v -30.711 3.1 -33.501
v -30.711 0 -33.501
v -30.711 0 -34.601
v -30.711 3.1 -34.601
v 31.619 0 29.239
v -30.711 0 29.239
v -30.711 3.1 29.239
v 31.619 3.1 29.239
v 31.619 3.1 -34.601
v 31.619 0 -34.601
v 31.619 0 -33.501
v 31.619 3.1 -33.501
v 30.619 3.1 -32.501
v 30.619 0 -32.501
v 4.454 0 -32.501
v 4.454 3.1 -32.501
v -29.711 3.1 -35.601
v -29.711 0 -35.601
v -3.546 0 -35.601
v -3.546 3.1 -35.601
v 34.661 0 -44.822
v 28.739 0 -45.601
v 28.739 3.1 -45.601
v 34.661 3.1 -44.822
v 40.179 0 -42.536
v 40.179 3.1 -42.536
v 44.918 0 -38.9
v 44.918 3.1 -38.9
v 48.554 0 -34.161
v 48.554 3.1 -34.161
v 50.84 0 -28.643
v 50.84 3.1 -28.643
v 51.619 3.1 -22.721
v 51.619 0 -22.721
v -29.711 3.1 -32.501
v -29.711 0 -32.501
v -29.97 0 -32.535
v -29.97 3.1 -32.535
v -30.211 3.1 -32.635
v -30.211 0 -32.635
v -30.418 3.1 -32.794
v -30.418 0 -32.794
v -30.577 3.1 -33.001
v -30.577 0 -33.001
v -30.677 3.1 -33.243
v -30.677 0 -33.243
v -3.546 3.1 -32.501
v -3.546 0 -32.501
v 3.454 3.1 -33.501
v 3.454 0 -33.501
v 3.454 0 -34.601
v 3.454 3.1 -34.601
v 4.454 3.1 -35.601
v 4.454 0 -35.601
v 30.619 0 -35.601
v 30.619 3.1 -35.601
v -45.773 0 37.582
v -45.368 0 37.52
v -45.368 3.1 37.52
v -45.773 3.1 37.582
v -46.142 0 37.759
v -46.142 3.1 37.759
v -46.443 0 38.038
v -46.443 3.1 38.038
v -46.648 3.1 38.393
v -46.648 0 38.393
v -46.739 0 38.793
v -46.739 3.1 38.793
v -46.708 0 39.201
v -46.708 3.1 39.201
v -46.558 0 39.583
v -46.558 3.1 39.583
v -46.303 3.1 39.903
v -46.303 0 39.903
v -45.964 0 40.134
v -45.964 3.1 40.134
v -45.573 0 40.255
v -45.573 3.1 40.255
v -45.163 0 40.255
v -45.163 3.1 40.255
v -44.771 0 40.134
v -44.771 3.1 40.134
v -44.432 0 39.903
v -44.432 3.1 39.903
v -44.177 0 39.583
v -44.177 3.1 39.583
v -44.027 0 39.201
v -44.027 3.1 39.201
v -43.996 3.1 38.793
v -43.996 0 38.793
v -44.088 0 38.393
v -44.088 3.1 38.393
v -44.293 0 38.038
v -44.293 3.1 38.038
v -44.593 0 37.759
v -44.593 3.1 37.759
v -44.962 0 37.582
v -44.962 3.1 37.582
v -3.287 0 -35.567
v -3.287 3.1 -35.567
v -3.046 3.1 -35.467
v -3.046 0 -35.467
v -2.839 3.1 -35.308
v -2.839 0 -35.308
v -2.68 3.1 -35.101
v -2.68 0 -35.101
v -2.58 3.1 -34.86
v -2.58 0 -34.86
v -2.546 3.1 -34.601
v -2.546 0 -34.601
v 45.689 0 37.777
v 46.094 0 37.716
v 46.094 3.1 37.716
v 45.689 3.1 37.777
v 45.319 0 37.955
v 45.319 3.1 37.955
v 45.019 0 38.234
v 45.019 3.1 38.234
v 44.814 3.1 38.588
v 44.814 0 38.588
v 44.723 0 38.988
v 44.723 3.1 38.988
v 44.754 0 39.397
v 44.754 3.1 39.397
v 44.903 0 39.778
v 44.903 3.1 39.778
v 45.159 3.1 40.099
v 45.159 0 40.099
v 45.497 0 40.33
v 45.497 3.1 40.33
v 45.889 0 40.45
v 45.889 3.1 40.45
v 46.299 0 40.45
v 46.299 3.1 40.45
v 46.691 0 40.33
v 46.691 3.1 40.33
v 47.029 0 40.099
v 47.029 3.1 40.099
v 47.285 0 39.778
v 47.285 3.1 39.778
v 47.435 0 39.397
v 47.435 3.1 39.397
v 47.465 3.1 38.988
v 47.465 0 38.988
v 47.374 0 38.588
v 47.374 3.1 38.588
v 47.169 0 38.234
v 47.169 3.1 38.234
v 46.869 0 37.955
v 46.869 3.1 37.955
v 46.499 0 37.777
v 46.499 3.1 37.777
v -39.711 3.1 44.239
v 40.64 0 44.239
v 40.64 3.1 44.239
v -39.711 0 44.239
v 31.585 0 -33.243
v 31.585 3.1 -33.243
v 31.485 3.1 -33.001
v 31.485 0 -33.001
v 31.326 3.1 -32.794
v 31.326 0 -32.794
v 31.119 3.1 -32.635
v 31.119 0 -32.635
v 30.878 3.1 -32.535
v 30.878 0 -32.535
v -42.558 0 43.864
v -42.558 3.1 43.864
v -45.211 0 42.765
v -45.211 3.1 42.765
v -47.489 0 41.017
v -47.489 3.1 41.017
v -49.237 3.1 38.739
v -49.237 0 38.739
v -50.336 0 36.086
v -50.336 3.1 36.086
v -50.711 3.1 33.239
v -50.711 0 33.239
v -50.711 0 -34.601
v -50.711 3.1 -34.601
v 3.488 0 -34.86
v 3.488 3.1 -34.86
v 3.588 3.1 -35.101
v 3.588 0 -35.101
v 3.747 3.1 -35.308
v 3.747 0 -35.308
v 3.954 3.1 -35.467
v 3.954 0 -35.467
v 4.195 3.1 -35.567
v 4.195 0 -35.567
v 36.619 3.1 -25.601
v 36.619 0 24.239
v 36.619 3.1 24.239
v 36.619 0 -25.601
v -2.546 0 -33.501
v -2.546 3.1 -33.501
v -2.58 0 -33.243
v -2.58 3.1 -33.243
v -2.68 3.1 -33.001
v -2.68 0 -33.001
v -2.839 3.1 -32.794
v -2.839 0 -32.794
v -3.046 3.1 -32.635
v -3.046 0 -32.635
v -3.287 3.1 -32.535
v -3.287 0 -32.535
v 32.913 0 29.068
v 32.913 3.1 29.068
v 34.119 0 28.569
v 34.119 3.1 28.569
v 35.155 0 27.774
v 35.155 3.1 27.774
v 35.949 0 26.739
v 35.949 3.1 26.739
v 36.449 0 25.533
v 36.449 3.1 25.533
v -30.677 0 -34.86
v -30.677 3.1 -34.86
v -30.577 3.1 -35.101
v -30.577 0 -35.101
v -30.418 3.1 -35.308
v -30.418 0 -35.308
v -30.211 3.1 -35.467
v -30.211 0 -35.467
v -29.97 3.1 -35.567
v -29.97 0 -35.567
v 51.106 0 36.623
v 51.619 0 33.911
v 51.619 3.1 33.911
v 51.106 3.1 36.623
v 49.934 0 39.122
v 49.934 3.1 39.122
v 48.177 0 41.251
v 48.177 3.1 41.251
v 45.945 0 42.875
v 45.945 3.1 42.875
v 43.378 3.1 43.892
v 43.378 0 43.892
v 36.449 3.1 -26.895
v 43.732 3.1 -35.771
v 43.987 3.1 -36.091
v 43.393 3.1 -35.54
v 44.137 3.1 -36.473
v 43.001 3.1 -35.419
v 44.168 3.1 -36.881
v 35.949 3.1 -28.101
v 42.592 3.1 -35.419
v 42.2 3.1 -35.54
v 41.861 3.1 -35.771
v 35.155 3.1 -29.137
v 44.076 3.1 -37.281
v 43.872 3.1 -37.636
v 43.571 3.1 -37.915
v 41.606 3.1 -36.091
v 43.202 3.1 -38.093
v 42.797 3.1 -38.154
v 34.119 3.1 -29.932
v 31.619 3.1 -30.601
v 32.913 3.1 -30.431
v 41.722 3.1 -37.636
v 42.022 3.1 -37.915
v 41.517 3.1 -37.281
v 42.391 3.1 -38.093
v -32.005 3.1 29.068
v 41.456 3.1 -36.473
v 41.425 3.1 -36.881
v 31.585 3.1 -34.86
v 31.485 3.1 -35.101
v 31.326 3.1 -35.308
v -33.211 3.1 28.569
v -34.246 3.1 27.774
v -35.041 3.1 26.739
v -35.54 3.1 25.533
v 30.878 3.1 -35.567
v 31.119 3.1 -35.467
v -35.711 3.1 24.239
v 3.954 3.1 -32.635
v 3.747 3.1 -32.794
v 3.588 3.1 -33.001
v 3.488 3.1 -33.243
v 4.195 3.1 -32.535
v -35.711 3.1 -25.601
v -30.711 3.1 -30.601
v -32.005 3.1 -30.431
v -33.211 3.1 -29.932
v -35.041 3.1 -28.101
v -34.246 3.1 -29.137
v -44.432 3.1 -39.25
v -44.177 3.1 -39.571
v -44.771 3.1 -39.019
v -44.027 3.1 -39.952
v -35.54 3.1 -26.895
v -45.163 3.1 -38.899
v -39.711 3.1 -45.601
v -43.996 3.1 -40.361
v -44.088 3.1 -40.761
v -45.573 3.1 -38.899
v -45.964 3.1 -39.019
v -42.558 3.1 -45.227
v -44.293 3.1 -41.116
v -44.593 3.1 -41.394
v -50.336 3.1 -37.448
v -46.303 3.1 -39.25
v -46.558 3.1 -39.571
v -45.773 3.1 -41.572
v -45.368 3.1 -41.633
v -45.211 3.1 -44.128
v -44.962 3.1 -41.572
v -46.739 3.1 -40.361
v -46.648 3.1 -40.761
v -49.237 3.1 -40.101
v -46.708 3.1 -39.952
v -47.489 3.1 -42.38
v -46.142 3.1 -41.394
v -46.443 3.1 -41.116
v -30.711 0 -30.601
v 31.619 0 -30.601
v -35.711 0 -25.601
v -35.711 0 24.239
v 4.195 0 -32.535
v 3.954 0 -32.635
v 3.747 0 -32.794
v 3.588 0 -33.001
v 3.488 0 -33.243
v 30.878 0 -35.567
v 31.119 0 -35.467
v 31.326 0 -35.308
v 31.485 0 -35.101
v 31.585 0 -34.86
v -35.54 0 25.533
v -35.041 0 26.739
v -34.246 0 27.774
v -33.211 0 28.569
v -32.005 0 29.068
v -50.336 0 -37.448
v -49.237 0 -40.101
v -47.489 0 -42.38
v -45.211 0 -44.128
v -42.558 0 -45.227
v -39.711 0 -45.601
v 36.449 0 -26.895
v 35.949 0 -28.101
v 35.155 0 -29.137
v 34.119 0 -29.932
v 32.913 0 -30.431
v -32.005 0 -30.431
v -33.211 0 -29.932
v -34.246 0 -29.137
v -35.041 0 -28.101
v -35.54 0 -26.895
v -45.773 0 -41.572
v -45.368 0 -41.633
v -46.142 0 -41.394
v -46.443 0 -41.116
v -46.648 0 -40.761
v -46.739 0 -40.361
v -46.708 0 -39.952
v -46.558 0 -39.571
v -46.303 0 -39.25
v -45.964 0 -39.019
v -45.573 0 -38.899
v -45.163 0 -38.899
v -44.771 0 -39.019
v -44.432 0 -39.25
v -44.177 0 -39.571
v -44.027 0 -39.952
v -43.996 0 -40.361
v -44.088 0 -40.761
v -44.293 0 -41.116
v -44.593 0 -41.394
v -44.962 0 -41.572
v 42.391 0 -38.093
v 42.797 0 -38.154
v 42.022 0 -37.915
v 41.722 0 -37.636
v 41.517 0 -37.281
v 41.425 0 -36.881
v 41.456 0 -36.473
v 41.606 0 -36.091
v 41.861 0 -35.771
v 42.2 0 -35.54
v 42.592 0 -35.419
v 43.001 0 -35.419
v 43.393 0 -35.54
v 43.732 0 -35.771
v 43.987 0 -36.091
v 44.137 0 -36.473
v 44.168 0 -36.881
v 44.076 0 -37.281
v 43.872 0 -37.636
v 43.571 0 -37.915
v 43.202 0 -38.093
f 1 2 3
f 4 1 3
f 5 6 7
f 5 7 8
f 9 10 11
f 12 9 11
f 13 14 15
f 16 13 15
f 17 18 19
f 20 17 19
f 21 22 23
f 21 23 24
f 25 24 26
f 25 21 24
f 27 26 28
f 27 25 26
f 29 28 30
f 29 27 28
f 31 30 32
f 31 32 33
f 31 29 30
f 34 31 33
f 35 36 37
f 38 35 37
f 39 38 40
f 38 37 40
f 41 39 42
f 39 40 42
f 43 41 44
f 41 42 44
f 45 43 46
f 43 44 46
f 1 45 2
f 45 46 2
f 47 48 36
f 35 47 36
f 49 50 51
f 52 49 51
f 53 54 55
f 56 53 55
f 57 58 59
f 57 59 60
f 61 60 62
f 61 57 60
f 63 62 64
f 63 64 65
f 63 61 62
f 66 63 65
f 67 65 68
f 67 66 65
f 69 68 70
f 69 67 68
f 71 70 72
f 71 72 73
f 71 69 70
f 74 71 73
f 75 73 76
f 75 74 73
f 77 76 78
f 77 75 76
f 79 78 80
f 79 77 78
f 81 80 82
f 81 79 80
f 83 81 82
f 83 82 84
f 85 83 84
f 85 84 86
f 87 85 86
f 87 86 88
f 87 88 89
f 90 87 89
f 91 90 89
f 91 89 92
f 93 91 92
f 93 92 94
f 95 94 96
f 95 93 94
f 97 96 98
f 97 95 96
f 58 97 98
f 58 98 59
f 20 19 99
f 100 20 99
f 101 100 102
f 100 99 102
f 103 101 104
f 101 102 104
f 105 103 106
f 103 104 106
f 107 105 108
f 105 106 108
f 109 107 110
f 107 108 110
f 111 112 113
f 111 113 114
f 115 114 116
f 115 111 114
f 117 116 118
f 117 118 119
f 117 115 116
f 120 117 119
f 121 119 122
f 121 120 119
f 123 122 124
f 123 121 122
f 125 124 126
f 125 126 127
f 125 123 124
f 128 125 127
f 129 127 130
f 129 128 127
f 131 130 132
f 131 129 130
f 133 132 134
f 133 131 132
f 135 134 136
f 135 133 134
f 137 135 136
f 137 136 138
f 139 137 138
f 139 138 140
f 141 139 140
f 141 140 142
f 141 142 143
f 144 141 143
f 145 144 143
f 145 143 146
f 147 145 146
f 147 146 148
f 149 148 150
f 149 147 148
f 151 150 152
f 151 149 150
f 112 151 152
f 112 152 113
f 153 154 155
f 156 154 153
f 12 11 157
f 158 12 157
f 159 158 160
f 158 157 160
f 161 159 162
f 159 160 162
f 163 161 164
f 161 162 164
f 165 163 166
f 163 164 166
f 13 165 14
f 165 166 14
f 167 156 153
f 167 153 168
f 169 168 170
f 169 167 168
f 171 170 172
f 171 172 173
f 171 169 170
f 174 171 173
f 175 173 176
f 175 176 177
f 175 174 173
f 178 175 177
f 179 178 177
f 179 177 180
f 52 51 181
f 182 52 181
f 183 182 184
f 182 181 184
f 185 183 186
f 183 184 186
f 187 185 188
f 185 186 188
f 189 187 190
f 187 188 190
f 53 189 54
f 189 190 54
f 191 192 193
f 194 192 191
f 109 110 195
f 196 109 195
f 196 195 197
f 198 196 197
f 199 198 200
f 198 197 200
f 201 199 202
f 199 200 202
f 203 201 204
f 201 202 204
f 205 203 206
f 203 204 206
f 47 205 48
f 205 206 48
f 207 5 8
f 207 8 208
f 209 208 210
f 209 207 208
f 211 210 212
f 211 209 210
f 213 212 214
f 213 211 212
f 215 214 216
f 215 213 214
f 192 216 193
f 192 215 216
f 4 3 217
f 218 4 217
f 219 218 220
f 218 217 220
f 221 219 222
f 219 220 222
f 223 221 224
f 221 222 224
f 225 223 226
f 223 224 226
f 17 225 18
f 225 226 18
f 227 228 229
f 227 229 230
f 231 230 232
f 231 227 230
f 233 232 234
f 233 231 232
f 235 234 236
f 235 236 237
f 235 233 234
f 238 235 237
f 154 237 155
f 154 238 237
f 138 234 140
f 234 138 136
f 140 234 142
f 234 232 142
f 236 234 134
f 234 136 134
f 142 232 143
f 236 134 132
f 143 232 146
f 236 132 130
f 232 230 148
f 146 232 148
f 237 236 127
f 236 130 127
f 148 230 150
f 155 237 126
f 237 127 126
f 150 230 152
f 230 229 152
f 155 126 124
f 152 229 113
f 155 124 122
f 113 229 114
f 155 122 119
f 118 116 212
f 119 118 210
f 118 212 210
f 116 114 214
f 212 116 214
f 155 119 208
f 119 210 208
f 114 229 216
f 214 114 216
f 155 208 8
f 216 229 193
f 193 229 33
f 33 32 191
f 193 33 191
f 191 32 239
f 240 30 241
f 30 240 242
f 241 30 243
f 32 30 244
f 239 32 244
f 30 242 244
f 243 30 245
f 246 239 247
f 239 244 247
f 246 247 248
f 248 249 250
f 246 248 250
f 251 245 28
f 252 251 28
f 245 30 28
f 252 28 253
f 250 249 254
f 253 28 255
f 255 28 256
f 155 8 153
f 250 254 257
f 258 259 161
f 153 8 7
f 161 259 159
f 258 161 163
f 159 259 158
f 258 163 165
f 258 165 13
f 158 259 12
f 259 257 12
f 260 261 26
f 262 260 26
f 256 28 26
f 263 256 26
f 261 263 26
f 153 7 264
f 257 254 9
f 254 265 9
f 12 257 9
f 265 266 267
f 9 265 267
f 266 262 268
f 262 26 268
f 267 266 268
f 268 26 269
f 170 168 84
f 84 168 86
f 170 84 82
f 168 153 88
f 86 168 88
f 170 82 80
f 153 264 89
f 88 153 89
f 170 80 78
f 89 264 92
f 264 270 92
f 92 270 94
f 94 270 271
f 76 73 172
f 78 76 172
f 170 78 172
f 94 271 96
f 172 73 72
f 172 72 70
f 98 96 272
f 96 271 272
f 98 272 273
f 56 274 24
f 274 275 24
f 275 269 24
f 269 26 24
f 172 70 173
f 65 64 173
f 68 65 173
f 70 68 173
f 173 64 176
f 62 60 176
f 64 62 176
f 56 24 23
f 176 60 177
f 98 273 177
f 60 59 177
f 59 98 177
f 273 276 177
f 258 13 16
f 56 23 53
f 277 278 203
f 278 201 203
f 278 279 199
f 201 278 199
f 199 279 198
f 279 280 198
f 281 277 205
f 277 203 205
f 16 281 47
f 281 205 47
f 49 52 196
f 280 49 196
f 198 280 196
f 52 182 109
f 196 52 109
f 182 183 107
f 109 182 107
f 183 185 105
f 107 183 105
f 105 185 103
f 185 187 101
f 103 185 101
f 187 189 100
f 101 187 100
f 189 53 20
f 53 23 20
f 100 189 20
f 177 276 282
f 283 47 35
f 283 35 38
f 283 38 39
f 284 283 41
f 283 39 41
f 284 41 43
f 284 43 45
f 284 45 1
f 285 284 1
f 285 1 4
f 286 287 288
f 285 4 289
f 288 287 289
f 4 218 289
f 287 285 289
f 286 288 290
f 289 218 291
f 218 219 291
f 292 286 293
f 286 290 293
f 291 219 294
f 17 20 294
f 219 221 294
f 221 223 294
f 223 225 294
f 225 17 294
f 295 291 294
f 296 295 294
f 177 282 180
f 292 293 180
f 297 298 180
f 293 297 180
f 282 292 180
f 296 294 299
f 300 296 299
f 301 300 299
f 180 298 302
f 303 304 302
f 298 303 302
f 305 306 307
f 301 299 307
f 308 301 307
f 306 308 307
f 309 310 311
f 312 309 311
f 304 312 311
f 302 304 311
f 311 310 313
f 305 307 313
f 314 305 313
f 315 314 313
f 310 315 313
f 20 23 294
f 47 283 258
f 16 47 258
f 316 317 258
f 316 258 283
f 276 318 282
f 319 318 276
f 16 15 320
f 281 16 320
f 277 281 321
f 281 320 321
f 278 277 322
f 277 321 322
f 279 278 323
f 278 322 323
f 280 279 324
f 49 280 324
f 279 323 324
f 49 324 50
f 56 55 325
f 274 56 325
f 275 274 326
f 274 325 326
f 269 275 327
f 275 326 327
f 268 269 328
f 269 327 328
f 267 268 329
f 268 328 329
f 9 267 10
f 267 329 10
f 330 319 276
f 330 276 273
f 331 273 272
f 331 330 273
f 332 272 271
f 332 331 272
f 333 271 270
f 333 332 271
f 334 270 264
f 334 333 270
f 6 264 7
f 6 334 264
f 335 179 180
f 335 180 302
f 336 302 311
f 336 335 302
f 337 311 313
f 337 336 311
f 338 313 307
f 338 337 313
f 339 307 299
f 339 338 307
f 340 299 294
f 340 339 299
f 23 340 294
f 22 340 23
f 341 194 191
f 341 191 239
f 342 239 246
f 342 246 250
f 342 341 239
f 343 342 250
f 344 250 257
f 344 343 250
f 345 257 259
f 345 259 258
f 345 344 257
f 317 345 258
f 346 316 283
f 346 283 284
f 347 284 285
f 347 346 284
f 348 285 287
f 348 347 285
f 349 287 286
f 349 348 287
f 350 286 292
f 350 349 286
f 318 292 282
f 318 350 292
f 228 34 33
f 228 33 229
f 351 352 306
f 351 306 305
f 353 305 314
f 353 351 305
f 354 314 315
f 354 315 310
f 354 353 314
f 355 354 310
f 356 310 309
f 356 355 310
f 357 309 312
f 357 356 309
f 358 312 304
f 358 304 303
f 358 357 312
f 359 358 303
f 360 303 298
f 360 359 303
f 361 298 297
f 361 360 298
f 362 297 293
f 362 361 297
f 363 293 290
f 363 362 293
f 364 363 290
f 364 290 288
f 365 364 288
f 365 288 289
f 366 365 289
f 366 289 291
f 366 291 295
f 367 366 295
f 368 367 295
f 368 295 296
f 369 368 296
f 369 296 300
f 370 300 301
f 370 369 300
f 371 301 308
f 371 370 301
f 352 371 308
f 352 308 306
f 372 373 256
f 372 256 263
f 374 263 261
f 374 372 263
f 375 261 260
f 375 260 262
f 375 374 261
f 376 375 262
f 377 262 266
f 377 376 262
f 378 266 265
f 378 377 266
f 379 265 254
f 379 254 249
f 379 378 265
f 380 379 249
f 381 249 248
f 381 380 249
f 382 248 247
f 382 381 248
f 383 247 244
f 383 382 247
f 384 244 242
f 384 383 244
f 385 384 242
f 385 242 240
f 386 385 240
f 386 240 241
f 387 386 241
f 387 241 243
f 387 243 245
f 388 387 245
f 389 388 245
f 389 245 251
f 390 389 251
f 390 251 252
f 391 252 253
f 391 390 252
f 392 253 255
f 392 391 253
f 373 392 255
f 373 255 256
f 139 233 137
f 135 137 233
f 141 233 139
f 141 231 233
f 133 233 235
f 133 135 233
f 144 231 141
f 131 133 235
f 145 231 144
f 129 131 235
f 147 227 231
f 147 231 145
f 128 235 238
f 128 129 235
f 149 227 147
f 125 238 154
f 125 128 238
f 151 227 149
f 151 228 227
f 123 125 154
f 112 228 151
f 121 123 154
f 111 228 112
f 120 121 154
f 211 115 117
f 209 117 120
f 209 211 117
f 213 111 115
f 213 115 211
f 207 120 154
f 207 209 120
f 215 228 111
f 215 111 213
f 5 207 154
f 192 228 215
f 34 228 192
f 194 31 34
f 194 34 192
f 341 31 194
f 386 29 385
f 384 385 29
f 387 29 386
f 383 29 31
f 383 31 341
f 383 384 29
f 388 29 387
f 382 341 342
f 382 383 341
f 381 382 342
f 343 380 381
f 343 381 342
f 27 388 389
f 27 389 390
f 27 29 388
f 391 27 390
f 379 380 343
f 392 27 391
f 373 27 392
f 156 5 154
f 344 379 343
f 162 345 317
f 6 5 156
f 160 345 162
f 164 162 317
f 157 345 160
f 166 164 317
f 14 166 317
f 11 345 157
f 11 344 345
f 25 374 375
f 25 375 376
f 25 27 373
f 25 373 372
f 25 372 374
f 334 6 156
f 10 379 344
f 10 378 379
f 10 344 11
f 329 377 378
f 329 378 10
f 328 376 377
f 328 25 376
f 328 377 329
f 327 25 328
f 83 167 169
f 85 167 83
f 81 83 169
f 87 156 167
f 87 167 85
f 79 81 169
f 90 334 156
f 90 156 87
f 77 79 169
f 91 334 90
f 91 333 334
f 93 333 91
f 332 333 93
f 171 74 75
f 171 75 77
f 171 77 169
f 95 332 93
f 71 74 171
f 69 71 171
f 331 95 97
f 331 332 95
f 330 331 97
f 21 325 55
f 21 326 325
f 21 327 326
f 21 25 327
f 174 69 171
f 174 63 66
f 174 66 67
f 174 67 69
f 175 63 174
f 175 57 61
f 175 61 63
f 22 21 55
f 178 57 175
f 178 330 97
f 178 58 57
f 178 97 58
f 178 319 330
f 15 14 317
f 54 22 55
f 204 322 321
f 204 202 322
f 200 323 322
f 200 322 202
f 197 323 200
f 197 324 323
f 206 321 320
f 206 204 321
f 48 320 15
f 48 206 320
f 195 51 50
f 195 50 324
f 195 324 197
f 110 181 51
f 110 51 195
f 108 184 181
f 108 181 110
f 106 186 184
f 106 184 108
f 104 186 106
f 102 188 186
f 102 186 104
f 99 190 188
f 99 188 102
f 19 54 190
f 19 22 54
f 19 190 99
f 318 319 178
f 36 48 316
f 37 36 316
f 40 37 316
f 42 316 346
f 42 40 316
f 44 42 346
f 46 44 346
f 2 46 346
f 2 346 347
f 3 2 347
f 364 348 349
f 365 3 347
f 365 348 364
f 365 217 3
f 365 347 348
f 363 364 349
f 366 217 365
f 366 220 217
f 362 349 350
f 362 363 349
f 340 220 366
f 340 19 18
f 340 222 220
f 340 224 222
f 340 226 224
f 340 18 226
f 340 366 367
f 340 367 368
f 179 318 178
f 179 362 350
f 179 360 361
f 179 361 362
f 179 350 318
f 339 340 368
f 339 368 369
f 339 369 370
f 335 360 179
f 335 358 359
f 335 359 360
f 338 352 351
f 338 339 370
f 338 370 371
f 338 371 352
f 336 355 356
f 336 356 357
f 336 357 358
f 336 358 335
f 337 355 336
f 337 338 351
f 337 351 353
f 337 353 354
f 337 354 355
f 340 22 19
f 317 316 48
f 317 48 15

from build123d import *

# Parameters (mm, degrees)
SKETCH1_R           = 1.375
BOSS_EXTRUDE1_DEPTH = 3.1


with BuildPart() as part:
    # Sketch1 → Boss-Extrude1 (new body)
    with BuildSketch(Plane(origin=(0, 0, 0), x_dir=(1, 0, 0), z_dir=(0, 1, 0))):
        with BuildLine():
            Line((-39.71074184, 45.601377345), (28.739257907, 45.601389398))
            ThreePointArc((28.739257907, 45.601389398), (44.917862085, 38.899993272), (51.619259514, 22.721389634))
            Line((51.619259514, 22.721389634), (51.619259514, -33.910586665))
            ThreePointArc((51.619259514, -33.910586665), (48.176660713, -41.25083682), (40.639819253, -44.238608506))
            Line((40.639819253, -44.238608506), (-39.71072563, -44.238622655))
            ThreePointArc((-39.71072563, -44.238622655), (-47.488919901, -41.016788494), (-50.710740093, -33.238588436))
            Line((-50.710740093, -33.238588436), (-50.710740093, 34.601411853))
            ThreePointArc((-50.710740093, 34.601411853), (-47.48890491, 42.379565328), (-39.71074184, 45.601377345))
        make_face()
        with Locations(Location((-45.367589881, 40.25824398, 0), (0, 0, 90))):
            Circle(SKETCH1_R, mode=Mode.SUBTRACT)
        with Locations(Location((-45.367595522, -38.895467925, 0), (0, 0, 90))):
            Circle(SKETCH1_R, mode=Mode.SUBTRACT)
        with Locations(Location((46.094055761, -39.090799779, 0), (0, 0, 90))):
            Circle(SKETCH1_R, mode=Mode.SUBTRACT)
        with Locations(Location((42.796541827, 36.778672843, 0), (0, 0, 90))):
            Circle(SKETCH1_R, mode=Mode.SUBTRACT)
        with BuildLine():
            Line((36.619259514, -24.238609214), (36.619259514, 25.60137805))
            ThreePointArc((36.619259514, 25.60137805), (35.15479342, 29.136911955), (31.619259514, 30.60137805))
            Line((31.619259514, 30.60137805), (-30.710740093, 30.60137805))
            ThreePointArc((-30.710740093, 30.60137805), (-34.246273999, 29.136911955), (-35.710740093, 25.60137805))
            Line((-35.710740093, 25.60137805), (-35.710740093, -24.238609214))
            ThreePointArc((-35.710740093, -24.238609214), (-34.246273999, -27.77414312), (-30.710740093, -29.238609214))
            Line((-30.710740093, -29.238609214), (31.619259514, -29.238609214))
            ThreePointArc((31.619259514, -29.238609214), (35.15479342, -27.77414312), (36.619259514, -24.238609214))
        make_face(mode=Mode.SUBTRACT)
        with BuildLine():
            Line((4.454259711, 35.60137805), (30.619259514, 35.60137805))
            ThreePointArc((30.619259514, 35.60137805), (31.326366295, 35.308484831), (31.619259514, 34.60137805))
            Line((31.619259514, 34.60137805), (31.619259514, 33.50137805))
            ThreePointArc((31.619259514, 33.50137805), (31.326366295, 32.794271268), (30.619259514, 32.50137805))
            Line((30.619259514, 32.50137805), (4.454259711, 32.50137805))
            ThreePointArc((4.454259711, 32.50137805), (3.747152929, 32.794271268), (3.454259711, 33.50137805))
            Line((3.454259711, 33.50137805), (3.454259711, 34.60137805))
            ThreePointArc((3.454259711, 34.60137805), (3.747152929, 35.308484831), (4.454259711, 35.60137805))
        make_face(mode=Mode.SUBTRACT)
        with BuildLine():
            Line((-29.710740093, 35.60137805), (-3.545740289, 35.60137805))
            ThreePointArc((-3.545740289, 35.60137805), (-2.838633508, 35.308484831), (-2.545740289, 34.60137805))
            Line((-2.545740289, 34.60137805), (-2.545740289, 33.50137805))
            ThreePointArc((-2.545740289, 33.50137805), (-2.838633508, 32.794271268), (-3.545740289, 32.50137805))
            Line((-3.545740289, 32.50137805), (-29.710740093, 32.50137805))
            ThreePointArc((-29.710740093, 32.50137805), (-30.417846874, 32.794271268), (-30.710740093, 33.50137805))
            Line((-30.710740093, 33.50137805), (-30.710740093, 34.60137805))
            ThreePointArc((-30.710740093, 34.60137805), (-30.417846874, 35.308484831), (-29.710740093, 35.60137805))
        make_face(mode=Mode.SUBTRACT)
    extrude(amount=BOSS_EXTRUDE1_DEPTH)


solid = part.part
